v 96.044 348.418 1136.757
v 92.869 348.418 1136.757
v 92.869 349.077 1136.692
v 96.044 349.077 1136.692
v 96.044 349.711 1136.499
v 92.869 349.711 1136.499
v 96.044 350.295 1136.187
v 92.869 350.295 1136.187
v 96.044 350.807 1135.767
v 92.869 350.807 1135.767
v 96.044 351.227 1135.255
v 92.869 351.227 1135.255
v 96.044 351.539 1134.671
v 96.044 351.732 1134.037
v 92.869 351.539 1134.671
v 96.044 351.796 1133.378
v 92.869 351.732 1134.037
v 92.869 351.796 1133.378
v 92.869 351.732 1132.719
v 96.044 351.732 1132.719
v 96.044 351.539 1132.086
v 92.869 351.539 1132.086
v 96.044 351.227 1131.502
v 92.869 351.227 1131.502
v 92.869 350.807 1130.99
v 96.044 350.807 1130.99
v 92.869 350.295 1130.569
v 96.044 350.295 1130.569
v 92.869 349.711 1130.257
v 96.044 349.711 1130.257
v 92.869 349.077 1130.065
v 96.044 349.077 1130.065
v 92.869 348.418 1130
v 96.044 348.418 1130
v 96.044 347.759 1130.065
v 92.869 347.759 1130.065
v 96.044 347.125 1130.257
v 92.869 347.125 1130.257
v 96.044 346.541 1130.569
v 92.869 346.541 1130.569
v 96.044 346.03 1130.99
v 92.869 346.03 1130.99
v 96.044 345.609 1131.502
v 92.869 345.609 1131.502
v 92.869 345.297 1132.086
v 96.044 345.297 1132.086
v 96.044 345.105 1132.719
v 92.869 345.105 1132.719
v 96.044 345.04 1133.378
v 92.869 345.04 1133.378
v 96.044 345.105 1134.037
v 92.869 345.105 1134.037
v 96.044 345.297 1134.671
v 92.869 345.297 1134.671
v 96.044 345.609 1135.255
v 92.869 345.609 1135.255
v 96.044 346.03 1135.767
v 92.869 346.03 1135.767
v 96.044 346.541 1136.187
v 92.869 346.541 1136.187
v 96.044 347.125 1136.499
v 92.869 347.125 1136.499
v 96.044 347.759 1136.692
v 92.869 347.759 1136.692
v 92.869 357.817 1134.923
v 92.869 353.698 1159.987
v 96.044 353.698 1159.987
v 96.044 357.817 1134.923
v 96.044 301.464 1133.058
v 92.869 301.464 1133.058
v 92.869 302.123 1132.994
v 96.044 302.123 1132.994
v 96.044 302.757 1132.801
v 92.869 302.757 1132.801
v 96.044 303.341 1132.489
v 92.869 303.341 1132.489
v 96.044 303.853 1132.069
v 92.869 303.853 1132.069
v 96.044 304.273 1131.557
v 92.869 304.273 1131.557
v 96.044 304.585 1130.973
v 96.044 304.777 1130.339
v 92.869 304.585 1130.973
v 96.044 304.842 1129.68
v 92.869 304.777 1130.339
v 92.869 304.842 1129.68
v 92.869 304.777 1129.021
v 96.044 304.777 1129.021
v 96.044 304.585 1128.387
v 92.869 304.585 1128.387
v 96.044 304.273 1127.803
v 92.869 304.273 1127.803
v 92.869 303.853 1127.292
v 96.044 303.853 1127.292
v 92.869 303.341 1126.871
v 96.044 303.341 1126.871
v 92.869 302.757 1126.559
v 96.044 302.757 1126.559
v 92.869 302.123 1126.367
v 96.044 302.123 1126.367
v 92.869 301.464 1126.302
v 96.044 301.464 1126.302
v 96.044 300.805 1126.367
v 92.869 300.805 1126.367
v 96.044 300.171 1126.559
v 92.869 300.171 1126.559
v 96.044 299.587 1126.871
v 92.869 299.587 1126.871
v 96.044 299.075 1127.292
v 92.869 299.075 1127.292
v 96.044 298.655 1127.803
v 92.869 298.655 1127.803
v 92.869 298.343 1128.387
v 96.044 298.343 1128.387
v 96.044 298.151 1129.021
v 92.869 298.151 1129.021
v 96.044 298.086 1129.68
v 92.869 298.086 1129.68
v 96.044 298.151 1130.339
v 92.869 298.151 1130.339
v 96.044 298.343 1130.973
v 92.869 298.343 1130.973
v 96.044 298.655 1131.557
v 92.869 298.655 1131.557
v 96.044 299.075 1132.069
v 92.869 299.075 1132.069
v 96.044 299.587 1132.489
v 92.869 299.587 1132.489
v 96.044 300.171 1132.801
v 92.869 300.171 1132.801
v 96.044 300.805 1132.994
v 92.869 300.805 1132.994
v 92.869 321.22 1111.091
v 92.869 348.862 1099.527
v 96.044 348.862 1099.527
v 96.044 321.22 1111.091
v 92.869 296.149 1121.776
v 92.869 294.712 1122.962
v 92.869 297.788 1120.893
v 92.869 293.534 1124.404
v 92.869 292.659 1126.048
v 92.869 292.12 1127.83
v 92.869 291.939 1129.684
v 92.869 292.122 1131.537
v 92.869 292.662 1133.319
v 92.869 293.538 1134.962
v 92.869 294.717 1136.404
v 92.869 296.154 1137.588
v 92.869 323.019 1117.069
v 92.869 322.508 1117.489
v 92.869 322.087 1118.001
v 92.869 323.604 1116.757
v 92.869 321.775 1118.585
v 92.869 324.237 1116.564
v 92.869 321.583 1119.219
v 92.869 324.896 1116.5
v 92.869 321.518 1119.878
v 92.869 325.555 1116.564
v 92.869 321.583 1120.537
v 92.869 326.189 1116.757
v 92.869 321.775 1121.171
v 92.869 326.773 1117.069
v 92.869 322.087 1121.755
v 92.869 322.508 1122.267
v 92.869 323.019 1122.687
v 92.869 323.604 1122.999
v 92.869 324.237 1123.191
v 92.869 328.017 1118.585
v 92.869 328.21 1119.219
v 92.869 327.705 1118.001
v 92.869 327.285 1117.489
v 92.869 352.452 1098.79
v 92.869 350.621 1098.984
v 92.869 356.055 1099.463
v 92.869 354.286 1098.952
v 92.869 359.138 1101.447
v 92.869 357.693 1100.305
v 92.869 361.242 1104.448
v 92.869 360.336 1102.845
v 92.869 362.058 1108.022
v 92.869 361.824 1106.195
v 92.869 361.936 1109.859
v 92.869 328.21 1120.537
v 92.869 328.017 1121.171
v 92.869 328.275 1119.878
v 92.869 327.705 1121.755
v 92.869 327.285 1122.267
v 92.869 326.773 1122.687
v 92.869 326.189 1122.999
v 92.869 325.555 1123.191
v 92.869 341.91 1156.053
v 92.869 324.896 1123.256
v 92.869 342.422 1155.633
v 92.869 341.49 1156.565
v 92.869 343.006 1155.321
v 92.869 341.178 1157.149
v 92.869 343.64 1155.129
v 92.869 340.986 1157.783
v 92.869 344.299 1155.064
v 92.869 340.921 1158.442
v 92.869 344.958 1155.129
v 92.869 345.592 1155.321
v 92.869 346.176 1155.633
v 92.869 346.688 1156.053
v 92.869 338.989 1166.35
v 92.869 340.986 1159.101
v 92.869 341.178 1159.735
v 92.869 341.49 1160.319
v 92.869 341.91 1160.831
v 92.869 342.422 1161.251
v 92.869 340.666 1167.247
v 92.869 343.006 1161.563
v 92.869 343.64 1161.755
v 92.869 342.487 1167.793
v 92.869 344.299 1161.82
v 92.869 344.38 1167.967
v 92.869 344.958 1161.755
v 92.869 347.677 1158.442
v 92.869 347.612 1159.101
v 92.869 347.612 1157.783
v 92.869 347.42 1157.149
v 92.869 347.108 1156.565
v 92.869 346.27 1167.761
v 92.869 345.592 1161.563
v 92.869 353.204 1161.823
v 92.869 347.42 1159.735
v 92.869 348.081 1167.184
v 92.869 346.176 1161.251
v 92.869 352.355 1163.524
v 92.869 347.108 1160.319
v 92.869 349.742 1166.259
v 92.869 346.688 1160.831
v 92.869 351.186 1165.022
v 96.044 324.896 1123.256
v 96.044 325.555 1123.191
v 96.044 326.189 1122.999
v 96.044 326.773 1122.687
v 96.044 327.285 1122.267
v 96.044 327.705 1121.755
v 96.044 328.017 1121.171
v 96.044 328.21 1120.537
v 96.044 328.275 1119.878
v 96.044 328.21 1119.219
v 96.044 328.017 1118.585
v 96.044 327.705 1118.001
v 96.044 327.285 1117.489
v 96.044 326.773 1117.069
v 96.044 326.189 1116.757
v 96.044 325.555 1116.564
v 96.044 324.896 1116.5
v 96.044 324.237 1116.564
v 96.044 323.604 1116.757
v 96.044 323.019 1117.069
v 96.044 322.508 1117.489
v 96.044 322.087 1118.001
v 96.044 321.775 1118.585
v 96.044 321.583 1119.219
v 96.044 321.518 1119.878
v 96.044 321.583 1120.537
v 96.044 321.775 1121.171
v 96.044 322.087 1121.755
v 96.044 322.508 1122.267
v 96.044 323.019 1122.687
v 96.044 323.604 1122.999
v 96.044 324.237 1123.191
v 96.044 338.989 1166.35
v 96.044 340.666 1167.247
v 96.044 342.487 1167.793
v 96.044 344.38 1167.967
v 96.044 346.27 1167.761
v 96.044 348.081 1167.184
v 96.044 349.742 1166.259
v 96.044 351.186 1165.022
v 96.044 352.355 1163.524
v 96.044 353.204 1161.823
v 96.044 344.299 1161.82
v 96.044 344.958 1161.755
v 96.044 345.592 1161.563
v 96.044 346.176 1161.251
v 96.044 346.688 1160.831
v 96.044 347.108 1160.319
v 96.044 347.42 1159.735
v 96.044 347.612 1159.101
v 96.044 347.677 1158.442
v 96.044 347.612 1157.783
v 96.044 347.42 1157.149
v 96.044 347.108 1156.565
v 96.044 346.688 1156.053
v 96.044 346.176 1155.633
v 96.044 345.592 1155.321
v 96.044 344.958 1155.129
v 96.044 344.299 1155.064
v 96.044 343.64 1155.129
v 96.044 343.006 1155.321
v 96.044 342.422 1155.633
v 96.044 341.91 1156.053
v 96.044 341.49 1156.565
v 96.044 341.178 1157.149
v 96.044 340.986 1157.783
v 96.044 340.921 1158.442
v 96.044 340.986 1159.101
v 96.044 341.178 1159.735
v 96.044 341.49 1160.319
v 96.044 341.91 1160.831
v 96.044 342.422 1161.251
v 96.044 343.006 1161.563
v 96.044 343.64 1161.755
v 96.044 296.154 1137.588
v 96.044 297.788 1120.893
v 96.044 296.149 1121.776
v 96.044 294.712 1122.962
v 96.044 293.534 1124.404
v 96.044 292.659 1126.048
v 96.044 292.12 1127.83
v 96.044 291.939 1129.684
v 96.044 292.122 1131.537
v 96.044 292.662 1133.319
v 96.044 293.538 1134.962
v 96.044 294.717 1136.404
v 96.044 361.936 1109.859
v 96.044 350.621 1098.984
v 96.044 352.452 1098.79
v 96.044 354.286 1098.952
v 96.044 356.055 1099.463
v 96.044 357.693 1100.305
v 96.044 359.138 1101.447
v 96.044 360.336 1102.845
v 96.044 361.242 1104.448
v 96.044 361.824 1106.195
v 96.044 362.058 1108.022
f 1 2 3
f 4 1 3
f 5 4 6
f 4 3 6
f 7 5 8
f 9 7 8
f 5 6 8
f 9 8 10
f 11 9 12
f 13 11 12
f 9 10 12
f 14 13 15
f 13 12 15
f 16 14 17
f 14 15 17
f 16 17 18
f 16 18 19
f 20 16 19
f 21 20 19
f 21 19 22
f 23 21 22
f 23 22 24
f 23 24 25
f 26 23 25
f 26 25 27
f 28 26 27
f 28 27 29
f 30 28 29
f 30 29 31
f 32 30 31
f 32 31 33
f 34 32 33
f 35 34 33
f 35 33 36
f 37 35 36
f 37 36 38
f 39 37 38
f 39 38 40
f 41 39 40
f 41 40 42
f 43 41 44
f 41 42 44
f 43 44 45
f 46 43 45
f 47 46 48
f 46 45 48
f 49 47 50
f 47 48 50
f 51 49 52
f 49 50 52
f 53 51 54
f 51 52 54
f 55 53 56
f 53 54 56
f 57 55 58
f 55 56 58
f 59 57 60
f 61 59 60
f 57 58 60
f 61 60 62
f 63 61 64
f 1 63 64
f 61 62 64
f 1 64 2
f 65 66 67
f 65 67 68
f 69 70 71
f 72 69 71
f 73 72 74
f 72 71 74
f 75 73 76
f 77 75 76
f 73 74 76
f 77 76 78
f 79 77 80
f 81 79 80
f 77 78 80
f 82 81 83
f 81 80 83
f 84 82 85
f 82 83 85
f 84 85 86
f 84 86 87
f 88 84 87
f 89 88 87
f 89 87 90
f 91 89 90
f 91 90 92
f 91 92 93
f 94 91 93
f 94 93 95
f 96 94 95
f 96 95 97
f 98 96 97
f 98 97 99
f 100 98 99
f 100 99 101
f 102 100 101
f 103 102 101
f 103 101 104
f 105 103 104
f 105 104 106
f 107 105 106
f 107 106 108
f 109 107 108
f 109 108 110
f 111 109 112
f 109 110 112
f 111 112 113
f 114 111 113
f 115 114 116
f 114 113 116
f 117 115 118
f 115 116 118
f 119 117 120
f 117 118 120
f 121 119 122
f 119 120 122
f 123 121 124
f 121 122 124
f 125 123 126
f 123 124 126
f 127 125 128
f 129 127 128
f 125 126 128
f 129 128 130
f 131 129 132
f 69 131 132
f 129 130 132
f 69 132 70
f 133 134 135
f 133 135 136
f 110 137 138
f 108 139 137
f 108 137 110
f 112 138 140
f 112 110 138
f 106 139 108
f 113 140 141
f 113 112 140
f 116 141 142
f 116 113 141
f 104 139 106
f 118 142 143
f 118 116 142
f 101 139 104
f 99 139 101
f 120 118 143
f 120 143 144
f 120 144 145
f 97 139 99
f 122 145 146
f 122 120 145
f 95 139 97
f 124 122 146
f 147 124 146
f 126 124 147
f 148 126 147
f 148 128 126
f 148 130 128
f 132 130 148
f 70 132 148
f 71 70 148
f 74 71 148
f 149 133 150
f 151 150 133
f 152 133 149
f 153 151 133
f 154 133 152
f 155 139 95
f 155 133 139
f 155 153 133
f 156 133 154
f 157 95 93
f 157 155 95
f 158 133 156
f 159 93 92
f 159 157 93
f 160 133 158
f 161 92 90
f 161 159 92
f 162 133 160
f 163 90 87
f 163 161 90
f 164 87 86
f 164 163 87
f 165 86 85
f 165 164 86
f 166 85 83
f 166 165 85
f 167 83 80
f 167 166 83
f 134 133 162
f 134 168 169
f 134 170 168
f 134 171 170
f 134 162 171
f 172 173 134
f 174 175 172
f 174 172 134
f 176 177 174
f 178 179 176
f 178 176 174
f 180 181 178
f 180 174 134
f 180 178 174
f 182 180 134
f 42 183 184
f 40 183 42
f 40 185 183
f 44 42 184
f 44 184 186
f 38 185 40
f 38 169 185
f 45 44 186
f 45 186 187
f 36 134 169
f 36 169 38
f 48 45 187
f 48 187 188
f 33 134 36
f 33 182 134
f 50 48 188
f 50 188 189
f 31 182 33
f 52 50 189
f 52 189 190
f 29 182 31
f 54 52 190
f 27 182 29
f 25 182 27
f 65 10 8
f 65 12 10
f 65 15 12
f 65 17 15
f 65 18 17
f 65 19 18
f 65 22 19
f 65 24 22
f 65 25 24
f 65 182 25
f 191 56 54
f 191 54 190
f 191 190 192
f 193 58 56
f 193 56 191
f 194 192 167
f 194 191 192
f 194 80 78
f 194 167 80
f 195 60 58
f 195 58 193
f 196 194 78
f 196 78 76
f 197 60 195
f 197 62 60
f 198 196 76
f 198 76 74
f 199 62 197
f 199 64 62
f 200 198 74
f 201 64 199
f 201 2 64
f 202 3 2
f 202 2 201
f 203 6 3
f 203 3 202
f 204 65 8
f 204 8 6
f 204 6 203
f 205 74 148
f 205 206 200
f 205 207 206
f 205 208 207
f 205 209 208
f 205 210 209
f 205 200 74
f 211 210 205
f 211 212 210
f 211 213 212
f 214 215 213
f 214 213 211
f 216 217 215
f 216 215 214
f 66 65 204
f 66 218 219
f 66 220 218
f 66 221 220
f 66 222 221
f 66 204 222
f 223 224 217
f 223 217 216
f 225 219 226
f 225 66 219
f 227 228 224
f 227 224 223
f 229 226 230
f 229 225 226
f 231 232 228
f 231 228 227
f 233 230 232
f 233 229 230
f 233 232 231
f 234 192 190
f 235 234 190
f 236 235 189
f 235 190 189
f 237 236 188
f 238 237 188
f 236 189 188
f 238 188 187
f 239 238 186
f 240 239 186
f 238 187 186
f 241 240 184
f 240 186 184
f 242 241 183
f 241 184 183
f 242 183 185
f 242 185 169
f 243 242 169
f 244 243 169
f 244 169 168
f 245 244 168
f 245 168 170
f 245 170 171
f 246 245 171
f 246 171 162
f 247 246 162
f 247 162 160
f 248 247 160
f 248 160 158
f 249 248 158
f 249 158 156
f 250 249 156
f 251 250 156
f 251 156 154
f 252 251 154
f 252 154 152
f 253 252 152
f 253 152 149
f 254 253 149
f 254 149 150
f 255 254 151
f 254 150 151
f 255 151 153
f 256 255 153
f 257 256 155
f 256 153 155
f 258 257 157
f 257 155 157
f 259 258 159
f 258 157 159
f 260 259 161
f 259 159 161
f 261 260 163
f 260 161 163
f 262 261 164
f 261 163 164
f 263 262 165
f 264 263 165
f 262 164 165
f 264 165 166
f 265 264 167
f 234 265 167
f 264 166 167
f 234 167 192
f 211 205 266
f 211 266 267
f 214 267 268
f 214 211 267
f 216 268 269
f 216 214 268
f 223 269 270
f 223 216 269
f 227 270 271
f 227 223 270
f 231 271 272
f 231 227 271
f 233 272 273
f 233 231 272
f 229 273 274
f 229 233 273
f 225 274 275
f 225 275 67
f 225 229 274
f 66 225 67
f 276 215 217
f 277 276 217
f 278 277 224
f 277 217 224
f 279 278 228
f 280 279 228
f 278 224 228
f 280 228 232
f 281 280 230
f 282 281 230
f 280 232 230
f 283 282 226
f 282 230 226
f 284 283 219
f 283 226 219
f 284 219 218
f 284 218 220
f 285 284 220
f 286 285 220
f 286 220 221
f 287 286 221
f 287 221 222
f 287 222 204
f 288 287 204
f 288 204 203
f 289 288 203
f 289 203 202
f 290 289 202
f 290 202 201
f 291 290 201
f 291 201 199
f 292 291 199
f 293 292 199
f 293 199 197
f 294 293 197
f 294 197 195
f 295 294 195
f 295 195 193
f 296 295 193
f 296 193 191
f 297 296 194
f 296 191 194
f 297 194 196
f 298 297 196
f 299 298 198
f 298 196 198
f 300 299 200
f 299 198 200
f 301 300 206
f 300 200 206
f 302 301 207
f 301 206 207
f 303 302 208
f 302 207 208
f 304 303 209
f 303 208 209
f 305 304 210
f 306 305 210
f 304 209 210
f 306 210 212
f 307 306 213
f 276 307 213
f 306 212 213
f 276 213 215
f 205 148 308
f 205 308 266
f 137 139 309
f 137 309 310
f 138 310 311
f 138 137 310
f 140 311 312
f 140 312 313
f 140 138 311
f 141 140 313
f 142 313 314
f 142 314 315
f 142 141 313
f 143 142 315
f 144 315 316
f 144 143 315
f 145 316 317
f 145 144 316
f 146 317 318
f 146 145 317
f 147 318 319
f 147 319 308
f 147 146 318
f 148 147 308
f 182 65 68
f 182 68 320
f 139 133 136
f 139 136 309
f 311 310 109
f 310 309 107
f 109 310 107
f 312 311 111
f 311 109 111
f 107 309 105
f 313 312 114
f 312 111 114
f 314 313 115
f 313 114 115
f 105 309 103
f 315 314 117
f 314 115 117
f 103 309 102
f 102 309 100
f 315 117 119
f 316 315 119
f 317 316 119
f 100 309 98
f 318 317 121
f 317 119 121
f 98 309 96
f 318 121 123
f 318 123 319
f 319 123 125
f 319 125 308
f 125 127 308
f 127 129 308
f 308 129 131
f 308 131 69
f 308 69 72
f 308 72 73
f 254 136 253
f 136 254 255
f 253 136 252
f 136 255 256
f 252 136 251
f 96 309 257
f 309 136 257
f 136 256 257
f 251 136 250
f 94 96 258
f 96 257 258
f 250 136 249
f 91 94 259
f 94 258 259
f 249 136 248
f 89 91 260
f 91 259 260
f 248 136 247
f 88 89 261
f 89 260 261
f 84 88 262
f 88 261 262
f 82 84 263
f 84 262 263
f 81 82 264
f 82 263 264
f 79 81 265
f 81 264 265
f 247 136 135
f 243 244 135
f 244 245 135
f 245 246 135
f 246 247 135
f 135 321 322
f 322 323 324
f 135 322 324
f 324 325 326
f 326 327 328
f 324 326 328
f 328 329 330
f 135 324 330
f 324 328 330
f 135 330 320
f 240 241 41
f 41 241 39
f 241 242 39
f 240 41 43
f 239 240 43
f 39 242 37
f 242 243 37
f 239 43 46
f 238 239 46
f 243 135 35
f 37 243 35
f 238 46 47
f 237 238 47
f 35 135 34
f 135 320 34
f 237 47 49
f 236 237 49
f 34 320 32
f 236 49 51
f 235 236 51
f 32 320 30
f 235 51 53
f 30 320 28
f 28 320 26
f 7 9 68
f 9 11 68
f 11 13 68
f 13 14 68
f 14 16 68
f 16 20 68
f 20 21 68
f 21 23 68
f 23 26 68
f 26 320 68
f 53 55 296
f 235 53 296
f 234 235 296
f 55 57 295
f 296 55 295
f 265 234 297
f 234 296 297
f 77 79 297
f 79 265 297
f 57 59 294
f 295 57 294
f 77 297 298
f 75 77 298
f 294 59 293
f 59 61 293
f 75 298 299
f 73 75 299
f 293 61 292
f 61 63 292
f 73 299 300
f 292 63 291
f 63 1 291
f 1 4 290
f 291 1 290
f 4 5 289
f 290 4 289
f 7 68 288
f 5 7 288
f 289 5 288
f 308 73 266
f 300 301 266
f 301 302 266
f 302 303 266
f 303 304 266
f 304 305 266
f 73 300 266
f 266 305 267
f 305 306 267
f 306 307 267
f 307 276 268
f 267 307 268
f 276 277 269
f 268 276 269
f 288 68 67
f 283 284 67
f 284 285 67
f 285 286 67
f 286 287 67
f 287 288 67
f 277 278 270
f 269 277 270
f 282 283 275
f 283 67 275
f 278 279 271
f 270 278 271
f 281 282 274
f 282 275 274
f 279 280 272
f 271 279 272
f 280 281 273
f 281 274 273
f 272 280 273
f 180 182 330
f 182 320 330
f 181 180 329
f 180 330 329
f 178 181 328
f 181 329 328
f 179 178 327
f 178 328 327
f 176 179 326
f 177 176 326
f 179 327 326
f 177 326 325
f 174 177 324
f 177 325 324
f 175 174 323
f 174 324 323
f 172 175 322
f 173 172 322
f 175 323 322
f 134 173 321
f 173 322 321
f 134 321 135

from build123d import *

# Parameters (mm, degrees)
BOSS_EXTRUDE1_START     = 92.868812
BOSS_EXTRUDE1_DEPTH     = 3.175
FILLET1_R               = 9.525
F_1_4_CLEARANCE_HOLE1_D = 6.7564


with BuildPart() as part:
    # Sketch2 → Boss-Extrude1 (new body)
    with BuildSketch(Plane(origin=(0, 0, 0), x_dir=(0, 0, -1), z_dir=(1, 0, 0)).offset(BOSS_EXTRUDE1_START)):
        with BuildLine():
            Line((-1159.986800073, 353.698023512), (-1134.923032257, 357.817191252))
            Line((-1134.923032257, 357.817191252), (-1092.891252047, 364.725009516))
            Line((-1092.891252047, 364.725009516), (-1111.090669966, 321.220387339))
            Line((-1111.090669966, 321.220387339), (-1120.893160292, 297.788119344))
            ThreePointArc((-1120.893160292, 297.788119344), (-1128.752566193, 291.984337623), (-1137.588017099, 296.1543437))
            Line((-1137.588017099, 296.1543437), (-1166.34986848, 338.989401064))
            ThreePointArc((-1166.34986848, 338.989401064), (-1167.184141053, 348.080982608), (-1159.986800073, 353.698023512))
        make_face()
    extrude(amount=BOSS_EXTRUDE1_DEPTH)

    # Fillet1
    fillet1_edges = [part.edges().sort_by_distance(p)[0] for p in [
        (94.456312, 364.725009516, 1092.891252047),
    ]]
    fillet(fillet1_edges, radius=FILLET1_R)

    # 1/4 Clearance Hole1 (through all)
    with Locations(Plane(origin=(96.043812484, 0, 0), x_dir=(0, 0, -1), z_dir=(1, 0, 0))):
        with Locations((-1133.378344355, 348.418278321), (-1158.442112171, 344.299110581), (-1129.68026079, 301.464053216), (-1119.877770464, 324.896321212)):
            Hole(F_1_4_CLEARANCE_HOLE1_D / 2)


solid = part.part
